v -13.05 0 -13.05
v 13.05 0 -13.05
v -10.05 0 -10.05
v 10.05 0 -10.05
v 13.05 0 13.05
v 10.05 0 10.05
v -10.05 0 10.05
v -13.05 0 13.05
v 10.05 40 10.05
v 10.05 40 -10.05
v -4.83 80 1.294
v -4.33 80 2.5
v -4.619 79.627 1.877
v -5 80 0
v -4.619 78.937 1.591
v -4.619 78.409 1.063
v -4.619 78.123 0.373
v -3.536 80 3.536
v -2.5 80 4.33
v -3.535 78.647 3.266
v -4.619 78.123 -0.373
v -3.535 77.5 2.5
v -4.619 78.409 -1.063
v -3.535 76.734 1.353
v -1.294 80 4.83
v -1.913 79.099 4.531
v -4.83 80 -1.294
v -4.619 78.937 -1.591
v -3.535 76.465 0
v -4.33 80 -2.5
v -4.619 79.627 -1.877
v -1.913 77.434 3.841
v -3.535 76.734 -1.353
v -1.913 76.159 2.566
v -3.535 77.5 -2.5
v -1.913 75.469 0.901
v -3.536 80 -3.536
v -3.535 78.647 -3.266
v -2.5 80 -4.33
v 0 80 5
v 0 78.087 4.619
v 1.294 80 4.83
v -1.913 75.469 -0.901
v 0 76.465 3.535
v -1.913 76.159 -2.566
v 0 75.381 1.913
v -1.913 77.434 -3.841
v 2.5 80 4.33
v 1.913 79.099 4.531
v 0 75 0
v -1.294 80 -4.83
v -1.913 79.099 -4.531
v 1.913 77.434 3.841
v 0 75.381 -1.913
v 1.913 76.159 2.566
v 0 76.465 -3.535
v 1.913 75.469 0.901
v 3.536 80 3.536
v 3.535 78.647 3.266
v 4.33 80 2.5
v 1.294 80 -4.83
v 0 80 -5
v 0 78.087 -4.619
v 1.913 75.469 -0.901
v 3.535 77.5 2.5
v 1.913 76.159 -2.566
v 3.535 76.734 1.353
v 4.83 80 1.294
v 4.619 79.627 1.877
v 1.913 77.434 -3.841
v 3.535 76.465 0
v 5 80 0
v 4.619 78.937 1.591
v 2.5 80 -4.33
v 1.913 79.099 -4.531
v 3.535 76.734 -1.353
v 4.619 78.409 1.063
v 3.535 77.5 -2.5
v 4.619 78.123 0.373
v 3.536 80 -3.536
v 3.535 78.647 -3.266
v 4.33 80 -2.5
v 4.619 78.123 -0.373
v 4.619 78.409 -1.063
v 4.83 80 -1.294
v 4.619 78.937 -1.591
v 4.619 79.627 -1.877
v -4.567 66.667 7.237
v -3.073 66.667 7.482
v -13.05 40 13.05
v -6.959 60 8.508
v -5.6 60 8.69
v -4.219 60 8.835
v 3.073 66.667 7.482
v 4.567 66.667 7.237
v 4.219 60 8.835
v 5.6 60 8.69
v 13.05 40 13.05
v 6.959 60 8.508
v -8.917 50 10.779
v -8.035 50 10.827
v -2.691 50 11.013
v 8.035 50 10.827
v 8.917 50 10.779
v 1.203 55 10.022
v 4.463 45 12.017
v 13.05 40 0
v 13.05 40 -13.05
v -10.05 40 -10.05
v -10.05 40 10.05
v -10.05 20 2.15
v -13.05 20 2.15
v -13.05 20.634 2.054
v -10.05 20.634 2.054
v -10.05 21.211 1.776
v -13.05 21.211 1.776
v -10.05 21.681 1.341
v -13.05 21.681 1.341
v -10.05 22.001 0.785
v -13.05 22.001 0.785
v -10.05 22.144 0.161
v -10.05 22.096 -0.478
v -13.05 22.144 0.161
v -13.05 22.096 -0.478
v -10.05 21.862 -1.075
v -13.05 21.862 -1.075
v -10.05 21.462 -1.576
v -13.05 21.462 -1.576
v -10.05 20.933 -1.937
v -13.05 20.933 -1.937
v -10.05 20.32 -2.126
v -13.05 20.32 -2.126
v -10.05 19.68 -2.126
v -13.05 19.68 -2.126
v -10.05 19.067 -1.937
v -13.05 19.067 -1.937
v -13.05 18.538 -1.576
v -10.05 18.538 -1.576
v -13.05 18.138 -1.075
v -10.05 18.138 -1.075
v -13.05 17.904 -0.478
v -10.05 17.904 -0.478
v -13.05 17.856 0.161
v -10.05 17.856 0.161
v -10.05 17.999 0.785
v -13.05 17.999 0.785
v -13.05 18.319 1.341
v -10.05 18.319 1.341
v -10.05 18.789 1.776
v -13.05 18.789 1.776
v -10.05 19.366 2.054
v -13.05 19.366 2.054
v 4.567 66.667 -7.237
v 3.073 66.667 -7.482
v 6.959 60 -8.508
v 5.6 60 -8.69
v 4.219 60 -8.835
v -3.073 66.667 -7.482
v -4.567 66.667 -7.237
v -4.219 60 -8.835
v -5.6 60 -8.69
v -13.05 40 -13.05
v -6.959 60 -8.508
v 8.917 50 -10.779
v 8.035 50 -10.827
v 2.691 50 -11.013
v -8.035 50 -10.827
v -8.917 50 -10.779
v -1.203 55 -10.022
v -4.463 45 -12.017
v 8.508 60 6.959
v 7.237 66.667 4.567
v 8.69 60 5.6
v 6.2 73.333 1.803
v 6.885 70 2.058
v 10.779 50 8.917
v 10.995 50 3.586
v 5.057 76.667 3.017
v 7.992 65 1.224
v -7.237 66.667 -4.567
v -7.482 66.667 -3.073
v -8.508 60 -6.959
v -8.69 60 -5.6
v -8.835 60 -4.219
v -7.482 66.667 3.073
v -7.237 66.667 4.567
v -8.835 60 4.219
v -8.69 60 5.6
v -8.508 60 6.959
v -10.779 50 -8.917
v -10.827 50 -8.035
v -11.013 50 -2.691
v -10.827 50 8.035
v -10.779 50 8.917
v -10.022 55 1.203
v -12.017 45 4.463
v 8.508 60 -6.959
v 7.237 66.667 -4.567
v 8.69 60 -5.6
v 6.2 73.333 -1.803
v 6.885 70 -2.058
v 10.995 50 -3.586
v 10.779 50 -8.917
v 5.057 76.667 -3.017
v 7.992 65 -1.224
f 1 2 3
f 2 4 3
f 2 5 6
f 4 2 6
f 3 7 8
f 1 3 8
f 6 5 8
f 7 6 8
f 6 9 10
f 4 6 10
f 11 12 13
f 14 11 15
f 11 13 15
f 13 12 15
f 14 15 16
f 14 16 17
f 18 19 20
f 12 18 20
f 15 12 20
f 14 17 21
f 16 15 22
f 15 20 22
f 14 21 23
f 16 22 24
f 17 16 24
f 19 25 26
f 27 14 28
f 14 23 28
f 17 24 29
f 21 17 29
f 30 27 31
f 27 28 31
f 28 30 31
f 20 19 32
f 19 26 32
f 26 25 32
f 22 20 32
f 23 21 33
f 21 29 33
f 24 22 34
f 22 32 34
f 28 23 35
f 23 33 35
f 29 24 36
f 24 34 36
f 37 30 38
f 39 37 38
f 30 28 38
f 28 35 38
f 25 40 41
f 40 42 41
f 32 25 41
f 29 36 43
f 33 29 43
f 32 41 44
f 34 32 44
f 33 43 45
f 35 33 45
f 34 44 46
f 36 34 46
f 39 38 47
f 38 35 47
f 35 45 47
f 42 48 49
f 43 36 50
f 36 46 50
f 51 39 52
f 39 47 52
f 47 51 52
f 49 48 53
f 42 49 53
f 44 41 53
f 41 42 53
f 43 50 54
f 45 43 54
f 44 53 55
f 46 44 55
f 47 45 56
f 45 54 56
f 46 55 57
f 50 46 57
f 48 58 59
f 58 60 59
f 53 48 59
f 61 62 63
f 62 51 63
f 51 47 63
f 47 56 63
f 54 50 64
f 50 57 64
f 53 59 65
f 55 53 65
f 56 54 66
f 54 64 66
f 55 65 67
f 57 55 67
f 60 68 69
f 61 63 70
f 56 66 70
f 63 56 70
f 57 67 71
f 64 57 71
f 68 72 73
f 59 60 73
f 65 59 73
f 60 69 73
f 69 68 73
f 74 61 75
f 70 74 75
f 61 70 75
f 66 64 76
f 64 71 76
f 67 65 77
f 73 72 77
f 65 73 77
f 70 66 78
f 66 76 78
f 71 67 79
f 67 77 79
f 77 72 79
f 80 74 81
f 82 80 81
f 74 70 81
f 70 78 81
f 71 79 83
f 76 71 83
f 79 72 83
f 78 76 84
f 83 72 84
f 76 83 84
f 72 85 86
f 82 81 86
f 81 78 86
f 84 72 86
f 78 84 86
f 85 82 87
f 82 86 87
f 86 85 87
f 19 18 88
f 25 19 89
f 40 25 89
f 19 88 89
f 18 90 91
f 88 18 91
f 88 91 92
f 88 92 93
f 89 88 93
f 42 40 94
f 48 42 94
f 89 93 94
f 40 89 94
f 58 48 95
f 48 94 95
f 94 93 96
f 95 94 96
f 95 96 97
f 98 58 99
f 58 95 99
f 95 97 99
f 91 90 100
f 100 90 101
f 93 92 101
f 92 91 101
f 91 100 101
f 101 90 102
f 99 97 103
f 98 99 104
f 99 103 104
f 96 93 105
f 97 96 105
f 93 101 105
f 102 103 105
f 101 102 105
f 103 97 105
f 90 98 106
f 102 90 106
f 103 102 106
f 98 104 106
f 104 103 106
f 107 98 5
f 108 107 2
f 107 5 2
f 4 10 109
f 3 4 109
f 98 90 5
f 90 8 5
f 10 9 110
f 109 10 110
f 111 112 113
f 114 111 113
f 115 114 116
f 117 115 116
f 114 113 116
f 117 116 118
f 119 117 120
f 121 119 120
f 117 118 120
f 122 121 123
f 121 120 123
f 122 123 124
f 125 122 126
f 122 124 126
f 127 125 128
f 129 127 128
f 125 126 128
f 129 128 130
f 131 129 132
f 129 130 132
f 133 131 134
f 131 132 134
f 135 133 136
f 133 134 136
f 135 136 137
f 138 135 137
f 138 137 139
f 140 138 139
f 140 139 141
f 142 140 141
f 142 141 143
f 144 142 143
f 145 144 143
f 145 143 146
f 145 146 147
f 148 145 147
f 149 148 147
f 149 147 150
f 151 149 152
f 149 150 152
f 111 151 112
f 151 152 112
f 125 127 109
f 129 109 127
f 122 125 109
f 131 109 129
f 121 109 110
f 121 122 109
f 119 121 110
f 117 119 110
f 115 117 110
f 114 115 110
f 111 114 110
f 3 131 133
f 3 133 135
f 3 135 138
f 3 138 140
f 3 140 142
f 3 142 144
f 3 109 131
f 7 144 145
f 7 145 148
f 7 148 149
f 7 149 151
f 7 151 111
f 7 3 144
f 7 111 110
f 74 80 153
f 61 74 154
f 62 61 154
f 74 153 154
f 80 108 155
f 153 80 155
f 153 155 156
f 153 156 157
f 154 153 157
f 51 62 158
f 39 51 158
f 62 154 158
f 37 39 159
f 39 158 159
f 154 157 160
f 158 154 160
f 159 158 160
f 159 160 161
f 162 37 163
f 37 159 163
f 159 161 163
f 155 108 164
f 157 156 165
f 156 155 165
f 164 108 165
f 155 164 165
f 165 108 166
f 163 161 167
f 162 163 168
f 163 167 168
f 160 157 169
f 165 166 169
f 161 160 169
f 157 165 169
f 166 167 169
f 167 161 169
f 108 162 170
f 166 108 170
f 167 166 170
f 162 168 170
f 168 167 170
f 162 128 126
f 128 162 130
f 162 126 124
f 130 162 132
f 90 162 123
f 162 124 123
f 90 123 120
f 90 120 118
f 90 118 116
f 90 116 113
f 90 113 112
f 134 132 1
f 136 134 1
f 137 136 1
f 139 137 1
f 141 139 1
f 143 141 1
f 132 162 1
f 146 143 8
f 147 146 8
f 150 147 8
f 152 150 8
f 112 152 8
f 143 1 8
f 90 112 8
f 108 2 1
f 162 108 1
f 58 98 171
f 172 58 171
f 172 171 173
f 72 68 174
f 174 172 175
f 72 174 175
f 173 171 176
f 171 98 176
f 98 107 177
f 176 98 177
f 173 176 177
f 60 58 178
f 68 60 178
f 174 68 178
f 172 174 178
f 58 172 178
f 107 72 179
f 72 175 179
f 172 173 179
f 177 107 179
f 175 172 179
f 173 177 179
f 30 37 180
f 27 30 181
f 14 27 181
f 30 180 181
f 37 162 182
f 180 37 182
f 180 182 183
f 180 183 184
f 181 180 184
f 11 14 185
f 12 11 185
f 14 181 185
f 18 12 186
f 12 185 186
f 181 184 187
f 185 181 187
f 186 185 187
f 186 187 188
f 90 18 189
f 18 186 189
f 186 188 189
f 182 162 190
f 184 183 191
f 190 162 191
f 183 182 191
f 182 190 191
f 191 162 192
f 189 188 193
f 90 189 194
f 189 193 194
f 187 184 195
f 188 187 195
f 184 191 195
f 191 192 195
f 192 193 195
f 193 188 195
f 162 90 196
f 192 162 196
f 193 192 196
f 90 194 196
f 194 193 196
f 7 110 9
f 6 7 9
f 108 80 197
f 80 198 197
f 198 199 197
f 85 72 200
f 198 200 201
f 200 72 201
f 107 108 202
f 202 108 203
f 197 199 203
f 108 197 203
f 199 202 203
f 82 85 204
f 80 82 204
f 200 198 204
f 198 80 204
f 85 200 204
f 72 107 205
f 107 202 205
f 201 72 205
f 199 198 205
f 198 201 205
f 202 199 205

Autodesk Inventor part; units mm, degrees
ref_plane "YZ Plane" through (0, 0, 0) normal (1, 0, 0) x (0, 1, 0)
ref_plane "XZ Plane" through (0, 0, 0) normal (0, 1, 0) x (-1, 0, 0)
sketch "Sketch2" plane through (0, 0, 0) normal (0, 1, 0) x (-1, 0, 0)
  line L0 (10.05, 10.05) -> (-10.05, 10.05)
  line L1 (-10.05, 10.05) -> (-10.05, -10.05)
  line L2 (-10.05, -10.05) -> (10.05, -10.05)
  line L3 (10.05, -10.05) -> (10.05, 10.05)
  line L4 (10.05, 10.05) -> (-10.05, -10.05) construction
  line L5 (-10.05, 10.05) -> (10.05, -10.05) construction
  line L6 (13.05, 13.05) -> (-13.05, 13.05)
  line L7 (-13.05, 13.05) -> (-13.05, -13.05)
  line L8 (-13.05, -13.05) -> (13.05, -13.05)
  line L9 (13.05, -13.05) -> (13.05, 13.05)
  point P0 (0, 0)
  dimension "d19" = 20.1
  dimension "d20" = 3
extrude "Extrusion2" add sketch "Sketch2" along normal blind 40
ref_plane "Work Plane1" through (0, 80, 0) normal (0, 1, 0) x (1, 0, 0)
sketch "Sketch3" plane through (0, 80, 0) normal (0, 1, 0) x (1, 0, 0)
  line L0 (-10.05, -10.05) -> (-10.05, 10.05) projected
  line L1 (10.05, 10.05) -> (10.05, -10.05) projected
  line L2 (-10.05, -10.05) -> (10.05, 10.05) construction
  circle A0 centre (0, 0) radius 5
  dimension "d24" = 10
sketch "Sketch4" plane through (0, 40, 0) normal (0, 1, 0) x (1, 0, 0)
  line L0 (13.05, -13.05) -> (13.05, 13.05) projected
  line L1 (13.05, 13.05) -> (-13.05, 13.05) projected
  line L2 (-13.05, 13.05) -> (-13.05, -13.05) projected
  line L3 (-13.05, -13.05) -> (13.05, -13.05) projected
  line L4 (-10.05, -10.05) -> (-10.05, 10.05) construction
  line L5 (-10.05, 10.05) -> (10.05, 10.05) projected
  line L6 (10.05, 10.05) -> (10.05, -10.05) projected
  line L7 (10.05, -10.05) -> (-10.05, -10.05) projected
  point P0 (0, 0)
loft "Loft1" add profiles "Sketch3", "Sketch4"
sketch "Sketch5" plane through (0, 80, 0) normal (0, 1, 0) x (1, 0, 0)
  arc A0 (-3.5355, 3.5355) -> (-3.5355, -3.5355) centre (0, 0) ccw projected
  line L0 (-5, 0) -> (5, 0)
  arc A1 (3.5355, -3.5355) -> (3.5355, 3.5355) centre (0, 0) ccw projected
  arc A2 (-3.5355, -3.5355) -> (3.5355, -3.5355) centre (0, 0) ccw projected
  arc A3 (3.5355, -3.5355) -> (3.5355, 3.5355) centre (0, 0) ccw projected
  arc A4 (3.5355, 3.5355) -> (-3.5355, 3.5355) centre (0, 0) ccw projected
  arc A5 (-3.5355, 3.5355) -> (-3.5355, -3.5355) centre (0, 0) ccw projected
  point P0 (-3.5355, -3.5355)
revolve "Revolution1" add sketch "Sketch5" angle 360 about axis through (-5, 80, 0) along (1, 0, 0) contours L0 A1 A2 A0
sketch "Sketch6" plane through (-13.05, 0, -13.05) normal (-1, 0, 0) x (0, 0, 1)
  line L0 (9.5145, 80) -> (0, 40) projected
  line L1 (26.1, 0) -> (26.1, 40) projected
  line L2 (0, 40) -> (26.1, 0) construction
  circle A0 centre (13.05, 20) radius 2.15
  point P0 (13.05, 0)
  dimension "d30" = 4.3
extrude "Extrusion3" cut sketch "Sketch6" against normal blind 18.855
equation "\"l1\" = 1"
properties part number "Pies" material "PET Plastic"
